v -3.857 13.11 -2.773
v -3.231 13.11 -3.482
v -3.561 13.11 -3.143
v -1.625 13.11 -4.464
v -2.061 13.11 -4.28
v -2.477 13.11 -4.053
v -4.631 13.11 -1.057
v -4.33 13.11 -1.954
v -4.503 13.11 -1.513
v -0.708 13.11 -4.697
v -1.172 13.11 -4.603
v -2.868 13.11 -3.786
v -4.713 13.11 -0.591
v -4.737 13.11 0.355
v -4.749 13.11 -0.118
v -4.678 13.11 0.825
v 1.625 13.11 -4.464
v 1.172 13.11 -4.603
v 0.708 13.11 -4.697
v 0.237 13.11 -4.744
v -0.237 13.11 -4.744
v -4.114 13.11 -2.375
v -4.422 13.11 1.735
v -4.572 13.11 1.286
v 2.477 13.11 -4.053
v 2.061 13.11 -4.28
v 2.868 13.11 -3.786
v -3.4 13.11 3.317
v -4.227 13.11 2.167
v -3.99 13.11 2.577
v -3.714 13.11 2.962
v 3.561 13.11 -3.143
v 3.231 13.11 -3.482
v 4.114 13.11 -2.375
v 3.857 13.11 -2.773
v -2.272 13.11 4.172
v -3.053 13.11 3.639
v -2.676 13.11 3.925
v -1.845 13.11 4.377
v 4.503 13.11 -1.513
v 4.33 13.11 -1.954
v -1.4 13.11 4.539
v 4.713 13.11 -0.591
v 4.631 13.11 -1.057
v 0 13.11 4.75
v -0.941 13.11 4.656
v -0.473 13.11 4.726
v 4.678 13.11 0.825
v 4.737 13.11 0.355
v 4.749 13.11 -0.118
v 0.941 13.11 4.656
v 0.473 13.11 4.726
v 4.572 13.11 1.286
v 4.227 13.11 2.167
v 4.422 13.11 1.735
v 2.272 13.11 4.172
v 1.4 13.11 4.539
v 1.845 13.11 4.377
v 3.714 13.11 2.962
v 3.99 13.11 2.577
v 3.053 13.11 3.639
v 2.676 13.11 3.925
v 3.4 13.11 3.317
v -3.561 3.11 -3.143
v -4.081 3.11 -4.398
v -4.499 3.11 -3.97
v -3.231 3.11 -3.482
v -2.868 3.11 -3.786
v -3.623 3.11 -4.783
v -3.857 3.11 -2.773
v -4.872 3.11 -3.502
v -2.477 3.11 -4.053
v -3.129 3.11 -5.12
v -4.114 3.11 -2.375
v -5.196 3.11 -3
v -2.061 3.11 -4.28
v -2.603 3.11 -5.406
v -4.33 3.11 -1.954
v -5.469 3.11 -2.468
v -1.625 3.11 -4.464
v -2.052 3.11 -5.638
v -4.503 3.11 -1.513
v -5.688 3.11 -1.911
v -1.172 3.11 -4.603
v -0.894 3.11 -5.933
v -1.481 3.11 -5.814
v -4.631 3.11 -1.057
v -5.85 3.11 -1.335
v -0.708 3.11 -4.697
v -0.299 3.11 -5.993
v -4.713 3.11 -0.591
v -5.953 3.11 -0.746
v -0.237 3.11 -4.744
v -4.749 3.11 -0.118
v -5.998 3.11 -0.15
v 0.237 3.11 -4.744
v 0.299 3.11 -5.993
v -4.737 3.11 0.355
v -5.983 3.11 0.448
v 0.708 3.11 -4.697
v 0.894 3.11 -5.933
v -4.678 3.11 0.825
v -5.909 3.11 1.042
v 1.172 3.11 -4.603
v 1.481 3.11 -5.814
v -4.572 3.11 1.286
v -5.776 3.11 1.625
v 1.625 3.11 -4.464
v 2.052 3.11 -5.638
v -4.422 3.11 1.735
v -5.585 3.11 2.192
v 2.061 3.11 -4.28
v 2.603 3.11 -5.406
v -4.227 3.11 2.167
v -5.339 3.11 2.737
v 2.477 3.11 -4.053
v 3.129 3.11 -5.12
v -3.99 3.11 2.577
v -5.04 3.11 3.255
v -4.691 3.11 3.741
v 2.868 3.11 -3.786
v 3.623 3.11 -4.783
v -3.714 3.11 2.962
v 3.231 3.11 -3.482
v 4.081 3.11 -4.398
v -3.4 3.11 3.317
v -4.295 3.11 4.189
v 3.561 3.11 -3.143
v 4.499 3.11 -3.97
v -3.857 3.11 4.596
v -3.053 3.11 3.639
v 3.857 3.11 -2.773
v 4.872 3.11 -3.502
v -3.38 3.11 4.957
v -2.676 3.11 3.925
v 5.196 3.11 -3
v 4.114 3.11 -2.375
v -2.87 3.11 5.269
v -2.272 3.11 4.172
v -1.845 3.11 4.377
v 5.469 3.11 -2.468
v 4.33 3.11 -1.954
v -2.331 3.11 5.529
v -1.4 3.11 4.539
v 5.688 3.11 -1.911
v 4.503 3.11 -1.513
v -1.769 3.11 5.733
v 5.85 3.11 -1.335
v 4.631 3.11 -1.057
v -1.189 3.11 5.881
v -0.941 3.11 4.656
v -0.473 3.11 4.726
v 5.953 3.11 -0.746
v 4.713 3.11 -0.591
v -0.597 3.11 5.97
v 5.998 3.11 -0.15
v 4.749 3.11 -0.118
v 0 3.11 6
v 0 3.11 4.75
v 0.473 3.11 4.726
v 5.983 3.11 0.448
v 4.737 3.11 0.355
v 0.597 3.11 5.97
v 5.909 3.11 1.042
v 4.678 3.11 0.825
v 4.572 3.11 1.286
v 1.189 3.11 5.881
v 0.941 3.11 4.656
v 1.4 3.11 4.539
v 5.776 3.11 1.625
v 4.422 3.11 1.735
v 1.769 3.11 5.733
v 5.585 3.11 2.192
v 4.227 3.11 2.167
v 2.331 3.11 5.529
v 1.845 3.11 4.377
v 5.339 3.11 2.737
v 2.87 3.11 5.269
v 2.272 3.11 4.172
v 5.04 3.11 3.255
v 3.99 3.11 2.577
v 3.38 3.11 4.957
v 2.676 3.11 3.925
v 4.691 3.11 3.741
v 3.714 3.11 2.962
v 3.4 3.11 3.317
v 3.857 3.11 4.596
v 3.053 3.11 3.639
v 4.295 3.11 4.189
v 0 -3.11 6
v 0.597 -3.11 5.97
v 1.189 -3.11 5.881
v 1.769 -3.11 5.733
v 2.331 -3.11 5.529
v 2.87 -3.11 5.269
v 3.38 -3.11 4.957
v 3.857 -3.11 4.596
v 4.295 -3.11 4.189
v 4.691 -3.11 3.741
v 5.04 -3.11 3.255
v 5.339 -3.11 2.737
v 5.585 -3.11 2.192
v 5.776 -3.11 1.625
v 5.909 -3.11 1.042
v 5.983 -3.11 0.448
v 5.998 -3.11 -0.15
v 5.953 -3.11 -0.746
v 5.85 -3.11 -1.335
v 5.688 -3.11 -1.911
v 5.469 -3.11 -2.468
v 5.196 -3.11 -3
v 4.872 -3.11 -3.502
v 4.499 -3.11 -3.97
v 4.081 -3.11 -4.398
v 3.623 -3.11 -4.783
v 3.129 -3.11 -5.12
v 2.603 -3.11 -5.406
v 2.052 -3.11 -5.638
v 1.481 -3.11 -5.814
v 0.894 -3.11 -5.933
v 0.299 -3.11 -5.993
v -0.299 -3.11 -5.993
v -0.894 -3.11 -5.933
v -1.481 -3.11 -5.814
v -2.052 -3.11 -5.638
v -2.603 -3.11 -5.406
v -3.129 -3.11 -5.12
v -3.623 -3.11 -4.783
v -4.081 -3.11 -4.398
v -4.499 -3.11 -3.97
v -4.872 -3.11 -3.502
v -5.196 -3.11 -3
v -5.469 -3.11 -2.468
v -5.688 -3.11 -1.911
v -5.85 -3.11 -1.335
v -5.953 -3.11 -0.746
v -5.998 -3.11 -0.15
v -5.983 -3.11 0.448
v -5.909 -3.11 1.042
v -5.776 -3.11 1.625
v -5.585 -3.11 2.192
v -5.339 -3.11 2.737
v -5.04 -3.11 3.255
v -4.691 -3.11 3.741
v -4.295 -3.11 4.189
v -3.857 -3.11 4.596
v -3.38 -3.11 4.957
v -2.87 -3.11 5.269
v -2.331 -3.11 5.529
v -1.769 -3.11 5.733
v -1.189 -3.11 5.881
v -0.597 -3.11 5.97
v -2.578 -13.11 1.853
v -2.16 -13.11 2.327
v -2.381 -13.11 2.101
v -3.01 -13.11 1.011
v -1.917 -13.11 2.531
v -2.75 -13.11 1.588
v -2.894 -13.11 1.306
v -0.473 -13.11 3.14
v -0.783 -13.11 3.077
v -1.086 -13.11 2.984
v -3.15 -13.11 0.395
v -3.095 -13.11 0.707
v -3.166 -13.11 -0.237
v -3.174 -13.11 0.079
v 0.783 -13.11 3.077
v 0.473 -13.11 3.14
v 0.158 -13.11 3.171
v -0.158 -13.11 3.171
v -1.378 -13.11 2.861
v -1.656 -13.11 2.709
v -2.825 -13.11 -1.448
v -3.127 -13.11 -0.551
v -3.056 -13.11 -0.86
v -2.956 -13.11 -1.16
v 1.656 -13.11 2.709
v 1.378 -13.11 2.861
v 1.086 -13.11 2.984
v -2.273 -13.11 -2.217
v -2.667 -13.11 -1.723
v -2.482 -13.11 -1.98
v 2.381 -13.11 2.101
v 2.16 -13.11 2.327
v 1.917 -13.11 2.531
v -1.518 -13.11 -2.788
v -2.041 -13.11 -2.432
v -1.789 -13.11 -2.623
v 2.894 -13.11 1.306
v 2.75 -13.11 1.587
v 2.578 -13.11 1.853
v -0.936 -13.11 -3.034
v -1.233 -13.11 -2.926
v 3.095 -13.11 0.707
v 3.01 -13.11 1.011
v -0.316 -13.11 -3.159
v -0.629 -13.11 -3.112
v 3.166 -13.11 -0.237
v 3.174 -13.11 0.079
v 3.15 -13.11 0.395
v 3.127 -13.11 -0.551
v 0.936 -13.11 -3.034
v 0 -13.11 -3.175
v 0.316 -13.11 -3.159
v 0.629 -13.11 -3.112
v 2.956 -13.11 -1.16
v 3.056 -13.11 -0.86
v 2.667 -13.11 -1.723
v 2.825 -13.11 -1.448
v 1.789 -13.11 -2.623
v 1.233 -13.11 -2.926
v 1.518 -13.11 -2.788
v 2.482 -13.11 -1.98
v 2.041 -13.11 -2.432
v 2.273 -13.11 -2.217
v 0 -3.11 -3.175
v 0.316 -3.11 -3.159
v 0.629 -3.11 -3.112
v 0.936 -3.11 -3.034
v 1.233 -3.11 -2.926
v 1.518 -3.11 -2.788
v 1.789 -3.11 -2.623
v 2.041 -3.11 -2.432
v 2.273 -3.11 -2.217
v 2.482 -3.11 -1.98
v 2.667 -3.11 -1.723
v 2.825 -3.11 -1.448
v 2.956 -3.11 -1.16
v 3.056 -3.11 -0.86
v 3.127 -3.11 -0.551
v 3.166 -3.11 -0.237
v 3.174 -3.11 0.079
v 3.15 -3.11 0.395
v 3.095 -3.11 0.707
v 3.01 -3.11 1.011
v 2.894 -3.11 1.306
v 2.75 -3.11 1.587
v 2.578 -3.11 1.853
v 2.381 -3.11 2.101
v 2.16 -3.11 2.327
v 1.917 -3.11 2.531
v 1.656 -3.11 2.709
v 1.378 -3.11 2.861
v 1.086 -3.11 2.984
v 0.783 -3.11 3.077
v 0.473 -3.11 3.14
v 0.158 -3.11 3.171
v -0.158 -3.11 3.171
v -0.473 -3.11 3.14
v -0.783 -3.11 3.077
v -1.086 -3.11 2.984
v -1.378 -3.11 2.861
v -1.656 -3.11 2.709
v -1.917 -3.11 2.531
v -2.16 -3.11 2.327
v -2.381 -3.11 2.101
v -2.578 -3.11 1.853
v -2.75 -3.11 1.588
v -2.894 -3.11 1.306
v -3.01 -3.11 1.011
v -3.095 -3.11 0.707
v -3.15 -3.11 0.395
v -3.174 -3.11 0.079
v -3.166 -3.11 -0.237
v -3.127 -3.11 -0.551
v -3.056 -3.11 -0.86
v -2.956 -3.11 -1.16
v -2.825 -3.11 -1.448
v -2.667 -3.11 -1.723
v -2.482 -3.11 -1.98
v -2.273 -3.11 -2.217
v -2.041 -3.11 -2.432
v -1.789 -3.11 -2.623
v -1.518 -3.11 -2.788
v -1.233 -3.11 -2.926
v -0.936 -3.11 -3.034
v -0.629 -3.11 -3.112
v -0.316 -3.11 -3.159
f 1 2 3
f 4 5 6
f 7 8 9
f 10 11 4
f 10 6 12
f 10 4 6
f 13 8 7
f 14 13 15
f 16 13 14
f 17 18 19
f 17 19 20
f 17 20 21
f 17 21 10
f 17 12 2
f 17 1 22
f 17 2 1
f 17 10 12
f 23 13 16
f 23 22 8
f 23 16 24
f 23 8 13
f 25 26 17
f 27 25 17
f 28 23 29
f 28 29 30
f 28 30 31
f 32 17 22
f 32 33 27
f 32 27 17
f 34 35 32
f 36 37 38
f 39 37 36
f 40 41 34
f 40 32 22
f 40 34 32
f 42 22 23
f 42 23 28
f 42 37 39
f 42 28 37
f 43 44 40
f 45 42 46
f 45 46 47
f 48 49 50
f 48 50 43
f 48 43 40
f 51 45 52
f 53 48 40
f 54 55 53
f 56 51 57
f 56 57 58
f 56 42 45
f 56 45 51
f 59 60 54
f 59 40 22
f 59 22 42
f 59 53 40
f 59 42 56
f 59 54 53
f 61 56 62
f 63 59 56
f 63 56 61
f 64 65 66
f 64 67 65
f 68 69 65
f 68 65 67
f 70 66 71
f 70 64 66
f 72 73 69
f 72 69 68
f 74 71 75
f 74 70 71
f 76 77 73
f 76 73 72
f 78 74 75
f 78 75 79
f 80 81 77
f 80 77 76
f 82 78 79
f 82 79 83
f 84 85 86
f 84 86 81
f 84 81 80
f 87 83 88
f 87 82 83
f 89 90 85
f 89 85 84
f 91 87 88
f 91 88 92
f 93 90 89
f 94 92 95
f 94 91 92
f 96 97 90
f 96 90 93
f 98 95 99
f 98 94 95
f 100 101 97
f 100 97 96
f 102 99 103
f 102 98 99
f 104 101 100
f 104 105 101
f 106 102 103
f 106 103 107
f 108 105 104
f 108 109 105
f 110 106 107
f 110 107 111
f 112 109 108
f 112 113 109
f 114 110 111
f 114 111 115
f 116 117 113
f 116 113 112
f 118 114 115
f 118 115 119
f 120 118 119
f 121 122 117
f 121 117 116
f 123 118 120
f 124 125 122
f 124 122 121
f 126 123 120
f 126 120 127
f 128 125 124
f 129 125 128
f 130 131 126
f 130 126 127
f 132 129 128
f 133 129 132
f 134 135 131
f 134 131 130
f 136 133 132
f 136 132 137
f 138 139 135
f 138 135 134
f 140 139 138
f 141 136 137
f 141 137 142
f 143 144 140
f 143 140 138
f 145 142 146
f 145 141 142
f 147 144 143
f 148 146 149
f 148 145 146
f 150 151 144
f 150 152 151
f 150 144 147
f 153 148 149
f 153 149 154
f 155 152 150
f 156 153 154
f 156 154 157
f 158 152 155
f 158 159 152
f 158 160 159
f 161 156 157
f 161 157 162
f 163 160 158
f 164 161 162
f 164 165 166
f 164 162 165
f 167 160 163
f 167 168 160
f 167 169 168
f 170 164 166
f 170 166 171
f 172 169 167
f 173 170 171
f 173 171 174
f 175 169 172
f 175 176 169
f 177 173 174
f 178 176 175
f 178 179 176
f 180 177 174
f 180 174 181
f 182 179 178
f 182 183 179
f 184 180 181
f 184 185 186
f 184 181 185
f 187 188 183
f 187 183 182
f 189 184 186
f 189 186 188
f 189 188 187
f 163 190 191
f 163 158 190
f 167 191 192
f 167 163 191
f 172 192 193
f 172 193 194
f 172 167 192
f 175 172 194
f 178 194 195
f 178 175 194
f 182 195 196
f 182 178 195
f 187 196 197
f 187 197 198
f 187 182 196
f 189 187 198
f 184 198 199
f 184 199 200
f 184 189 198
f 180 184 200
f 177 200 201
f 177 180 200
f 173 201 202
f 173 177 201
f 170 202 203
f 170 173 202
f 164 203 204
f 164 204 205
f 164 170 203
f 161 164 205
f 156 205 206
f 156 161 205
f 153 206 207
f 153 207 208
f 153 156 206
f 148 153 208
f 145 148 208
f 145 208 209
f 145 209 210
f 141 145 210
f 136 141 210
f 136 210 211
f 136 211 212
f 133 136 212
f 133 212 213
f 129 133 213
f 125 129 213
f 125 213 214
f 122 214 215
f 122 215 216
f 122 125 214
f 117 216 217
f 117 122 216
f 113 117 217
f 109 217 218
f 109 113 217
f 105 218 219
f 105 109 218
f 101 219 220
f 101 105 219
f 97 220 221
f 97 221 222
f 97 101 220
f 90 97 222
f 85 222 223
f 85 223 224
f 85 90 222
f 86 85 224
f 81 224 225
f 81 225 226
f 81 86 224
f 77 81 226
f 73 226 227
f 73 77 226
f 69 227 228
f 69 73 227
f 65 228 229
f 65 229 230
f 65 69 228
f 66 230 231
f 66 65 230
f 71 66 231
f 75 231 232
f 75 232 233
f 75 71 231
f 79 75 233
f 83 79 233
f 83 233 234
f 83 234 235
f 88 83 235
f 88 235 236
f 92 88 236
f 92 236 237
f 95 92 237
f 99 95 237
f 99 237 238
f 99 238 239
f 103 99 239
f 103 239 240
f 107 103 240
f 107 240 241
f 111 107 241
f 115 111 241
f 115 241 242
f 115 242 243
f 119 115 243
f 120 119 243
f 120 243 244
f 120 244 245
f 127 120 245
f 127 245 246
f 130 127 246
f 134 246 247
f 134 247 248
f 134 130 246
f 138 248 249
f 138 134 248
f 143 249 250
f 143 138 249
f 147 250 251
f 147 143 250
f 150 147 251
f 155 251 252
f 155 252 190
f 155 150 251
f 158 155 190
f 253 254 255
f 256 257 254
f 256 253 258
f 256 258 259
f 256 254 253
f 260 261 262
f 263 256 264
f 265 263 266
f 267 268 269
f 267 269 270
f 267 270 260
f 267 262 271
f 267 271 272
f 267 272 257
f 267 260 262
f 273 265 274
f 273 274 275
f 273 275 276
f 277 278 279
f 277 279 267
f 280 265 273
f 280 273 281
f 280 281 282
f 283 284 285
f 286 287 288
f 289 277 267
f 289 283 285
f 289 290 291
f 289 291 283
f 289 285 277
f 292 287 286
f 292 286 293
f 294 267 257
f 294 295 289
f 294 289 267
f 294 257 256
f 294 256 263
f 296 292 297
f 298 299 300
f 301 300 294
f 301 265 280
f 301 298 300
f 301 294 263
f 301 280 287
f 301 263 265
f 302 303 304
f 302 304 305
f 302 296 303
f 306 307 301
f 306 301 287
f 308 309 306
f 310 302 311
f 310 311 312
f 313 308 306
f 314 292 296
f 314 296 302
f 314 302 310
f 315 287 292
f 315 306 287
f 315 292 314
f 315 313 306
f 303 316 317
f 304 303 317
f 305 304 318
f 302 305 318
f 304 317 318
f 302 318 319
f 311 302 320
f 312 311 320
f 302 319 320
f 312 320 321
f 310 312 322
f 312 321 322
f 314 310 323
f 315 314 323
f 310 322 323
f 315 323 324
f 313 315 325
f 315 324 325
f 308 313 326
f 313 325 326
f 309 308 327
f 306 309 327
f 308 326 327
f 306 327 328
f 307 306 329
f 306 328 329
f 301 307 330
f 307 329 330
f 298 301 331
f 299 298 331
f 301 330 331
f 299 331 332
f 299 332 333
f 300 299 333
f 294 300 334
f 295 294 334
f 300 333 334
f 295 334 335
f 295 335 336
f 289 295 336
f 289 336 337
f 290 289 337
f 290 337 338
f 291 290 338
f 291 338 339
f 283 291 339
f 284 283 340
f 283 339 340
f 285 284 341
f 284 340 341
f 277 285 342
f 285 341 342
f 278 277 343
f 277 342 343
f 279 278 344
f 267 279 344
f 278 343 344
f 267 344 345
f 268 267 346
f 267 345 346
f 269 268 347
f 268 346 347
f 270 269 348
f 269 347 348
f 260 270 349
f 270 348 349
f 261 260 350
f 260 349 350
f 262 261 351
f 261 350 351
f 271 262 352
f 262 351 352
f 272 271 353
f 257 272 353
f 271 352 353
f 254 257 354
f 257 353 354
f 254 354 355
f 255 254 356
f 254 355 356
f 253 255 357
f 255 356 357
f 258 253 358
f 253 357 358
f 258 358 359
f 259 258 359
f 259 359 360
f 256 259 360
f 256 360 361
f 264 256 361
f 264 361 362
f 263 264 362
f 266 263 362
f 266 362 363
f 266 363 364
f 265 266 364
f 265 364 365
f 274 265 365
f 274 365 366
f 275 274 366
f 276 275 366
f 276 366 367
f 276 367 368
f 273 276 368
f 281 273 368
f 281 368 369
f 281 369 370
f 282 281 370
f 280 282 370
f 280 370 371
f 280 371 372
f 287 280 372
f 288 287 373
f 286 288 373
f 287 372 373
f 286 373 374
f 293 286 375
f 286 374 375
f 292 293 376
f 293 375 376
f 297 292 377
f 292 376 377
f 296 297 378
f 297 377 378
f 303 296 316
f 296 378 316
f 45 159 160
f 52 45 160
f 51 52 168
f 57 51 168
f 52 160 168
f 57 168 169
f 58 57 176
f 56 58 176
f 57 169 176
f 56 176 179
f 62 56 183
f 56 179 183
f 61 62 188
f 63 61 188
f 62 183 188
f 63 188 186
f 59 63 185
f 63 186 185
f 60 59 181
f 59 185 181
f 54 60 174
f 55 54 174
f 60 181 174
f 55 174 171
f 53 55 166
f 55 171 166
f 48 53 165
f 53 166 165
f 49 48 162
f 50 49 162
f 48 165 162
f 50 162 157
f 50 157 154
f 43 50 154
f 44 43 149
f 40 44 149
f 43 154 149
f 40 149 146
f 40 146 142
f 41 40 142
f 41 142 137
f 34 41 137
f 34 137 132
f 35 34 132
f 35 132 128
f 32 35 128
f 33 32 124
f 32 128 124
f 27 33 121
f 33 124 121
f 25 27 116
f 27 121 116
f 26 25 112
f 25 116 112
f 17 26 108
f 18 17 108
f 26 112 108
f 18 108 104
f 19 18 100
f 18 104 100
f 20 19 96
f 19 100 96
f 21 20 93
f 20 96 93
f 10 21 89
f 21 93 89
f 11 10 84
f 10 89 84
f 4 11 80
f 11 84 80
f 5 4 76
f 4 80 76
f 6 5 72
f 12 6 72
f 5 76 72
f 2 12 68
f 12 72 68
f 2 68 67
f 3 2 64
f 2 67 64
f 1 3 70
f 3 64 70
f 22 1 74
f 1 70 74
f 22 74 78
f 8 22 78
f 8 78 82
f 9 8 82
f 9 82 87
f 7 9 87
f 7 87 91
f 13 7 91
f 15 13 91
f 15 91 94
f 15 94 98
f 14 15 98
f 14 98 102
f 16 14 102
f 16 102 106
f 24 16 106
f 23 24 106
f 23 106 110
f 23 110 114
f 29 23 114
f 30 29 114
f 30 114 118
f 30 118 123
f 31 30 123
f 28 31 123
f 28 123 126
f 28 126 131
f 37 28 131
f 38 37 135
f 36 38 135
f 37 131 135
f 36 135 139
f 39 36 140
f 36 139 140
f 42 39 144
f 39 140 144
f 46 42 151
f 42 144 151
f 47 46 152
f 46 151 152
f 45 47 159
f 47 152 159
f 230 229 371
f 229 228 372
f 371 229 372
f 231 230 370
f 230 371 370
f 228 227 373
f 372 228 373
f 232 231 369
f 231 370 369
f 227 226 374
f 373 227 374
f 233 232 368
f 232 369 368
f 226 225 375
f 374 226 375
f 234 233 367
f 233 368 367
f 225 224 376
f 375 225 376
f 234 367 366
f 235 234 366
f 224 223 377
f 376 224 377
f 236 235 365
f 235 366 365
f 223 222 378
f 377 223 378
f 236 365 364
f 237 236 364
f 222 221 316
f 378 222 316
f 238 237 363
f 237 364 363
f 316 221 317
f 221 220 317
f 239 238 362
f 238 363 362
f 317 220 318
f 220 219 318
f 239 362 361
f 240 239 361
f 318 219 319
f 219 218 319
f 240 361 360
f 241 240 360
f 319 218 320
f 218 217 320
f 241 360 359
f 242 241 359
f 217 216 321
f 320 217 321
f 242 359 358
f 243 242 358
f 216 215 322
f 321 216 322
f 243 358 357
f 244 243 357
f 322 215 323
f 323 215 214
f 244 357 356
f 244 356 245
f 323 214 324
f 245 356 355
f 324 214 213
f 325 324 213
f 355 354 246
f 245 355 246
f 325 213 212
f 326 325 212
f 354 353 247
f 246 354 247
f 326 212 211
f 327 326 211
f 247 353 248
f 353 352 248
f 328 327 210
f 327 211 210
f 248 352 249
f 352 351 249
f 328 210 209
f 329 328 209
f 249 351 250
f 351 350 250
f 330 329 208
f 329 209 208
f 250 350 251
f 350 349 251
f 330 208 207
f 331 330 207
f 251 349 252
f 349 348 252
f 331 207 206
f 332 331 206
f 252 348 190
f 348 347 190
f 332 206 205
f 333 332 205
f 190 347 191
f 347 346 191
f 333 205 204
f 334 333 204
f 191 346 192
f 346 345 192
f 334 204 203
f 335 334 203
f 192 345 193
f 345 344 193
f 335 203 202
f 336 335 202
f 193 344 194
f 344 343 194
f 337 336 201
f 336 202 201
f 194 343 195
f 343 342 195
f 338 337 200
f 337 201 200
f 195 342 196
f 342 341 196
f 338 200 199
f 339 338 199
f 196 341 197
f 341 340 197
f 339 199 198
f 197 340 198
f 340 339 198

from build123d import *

# Parameters (mm, degrees)
SKETCH1_R           = 6
BOSS_EXTRUDE1_DEPTH = 3.11
SKETCH2_R           = 4.75
BOSS_EXTRUDE2_DEPTH = 10
SKETCH3_R           = 3.175
BOSS_EXTRUDE3_DEPTH = 10


with BuildPart() as part:
    # Sketch1 → Boss-Extrude1 (new, symmetric)
    with BuildSketch(Plane(origin=(0, 0, 0), x_dir=(1, 0, 0), z_dir=(0, 1, 0))):
        with Locations(Location((0, 0, 0), (0, 0, 270))):
            Circle(SKETCH1_R)
    extrude(amount=BOSS_EXTRUDE1_DEPTH, both=True)

    # Sketch2 → Boss-Extrude2 (add)
    with BuildSketch(Plane(origin=(0, 3.11, 0), x_dir=(1, 0, 0), z_dir=(0, 1, 0))):
        with Locations(Location((0, 0, 0), (0, 0, 270))):
            Circle(SKETCH2_R)
    extrude(amount=BOSS_EXTRUDE2_DEPTH)

    # Sketch3 → Boss-Extrude3 (add)
    with BuildSketch(Plane.XZ.offset(3.11)):
        with Locations(Location((0, 0, 0), (0, 0, 270))):
            Circle(SKETCH3_R)
    extrude(amount=BOSS_EXTRUDE3_DEPTH)


solid = part.part
